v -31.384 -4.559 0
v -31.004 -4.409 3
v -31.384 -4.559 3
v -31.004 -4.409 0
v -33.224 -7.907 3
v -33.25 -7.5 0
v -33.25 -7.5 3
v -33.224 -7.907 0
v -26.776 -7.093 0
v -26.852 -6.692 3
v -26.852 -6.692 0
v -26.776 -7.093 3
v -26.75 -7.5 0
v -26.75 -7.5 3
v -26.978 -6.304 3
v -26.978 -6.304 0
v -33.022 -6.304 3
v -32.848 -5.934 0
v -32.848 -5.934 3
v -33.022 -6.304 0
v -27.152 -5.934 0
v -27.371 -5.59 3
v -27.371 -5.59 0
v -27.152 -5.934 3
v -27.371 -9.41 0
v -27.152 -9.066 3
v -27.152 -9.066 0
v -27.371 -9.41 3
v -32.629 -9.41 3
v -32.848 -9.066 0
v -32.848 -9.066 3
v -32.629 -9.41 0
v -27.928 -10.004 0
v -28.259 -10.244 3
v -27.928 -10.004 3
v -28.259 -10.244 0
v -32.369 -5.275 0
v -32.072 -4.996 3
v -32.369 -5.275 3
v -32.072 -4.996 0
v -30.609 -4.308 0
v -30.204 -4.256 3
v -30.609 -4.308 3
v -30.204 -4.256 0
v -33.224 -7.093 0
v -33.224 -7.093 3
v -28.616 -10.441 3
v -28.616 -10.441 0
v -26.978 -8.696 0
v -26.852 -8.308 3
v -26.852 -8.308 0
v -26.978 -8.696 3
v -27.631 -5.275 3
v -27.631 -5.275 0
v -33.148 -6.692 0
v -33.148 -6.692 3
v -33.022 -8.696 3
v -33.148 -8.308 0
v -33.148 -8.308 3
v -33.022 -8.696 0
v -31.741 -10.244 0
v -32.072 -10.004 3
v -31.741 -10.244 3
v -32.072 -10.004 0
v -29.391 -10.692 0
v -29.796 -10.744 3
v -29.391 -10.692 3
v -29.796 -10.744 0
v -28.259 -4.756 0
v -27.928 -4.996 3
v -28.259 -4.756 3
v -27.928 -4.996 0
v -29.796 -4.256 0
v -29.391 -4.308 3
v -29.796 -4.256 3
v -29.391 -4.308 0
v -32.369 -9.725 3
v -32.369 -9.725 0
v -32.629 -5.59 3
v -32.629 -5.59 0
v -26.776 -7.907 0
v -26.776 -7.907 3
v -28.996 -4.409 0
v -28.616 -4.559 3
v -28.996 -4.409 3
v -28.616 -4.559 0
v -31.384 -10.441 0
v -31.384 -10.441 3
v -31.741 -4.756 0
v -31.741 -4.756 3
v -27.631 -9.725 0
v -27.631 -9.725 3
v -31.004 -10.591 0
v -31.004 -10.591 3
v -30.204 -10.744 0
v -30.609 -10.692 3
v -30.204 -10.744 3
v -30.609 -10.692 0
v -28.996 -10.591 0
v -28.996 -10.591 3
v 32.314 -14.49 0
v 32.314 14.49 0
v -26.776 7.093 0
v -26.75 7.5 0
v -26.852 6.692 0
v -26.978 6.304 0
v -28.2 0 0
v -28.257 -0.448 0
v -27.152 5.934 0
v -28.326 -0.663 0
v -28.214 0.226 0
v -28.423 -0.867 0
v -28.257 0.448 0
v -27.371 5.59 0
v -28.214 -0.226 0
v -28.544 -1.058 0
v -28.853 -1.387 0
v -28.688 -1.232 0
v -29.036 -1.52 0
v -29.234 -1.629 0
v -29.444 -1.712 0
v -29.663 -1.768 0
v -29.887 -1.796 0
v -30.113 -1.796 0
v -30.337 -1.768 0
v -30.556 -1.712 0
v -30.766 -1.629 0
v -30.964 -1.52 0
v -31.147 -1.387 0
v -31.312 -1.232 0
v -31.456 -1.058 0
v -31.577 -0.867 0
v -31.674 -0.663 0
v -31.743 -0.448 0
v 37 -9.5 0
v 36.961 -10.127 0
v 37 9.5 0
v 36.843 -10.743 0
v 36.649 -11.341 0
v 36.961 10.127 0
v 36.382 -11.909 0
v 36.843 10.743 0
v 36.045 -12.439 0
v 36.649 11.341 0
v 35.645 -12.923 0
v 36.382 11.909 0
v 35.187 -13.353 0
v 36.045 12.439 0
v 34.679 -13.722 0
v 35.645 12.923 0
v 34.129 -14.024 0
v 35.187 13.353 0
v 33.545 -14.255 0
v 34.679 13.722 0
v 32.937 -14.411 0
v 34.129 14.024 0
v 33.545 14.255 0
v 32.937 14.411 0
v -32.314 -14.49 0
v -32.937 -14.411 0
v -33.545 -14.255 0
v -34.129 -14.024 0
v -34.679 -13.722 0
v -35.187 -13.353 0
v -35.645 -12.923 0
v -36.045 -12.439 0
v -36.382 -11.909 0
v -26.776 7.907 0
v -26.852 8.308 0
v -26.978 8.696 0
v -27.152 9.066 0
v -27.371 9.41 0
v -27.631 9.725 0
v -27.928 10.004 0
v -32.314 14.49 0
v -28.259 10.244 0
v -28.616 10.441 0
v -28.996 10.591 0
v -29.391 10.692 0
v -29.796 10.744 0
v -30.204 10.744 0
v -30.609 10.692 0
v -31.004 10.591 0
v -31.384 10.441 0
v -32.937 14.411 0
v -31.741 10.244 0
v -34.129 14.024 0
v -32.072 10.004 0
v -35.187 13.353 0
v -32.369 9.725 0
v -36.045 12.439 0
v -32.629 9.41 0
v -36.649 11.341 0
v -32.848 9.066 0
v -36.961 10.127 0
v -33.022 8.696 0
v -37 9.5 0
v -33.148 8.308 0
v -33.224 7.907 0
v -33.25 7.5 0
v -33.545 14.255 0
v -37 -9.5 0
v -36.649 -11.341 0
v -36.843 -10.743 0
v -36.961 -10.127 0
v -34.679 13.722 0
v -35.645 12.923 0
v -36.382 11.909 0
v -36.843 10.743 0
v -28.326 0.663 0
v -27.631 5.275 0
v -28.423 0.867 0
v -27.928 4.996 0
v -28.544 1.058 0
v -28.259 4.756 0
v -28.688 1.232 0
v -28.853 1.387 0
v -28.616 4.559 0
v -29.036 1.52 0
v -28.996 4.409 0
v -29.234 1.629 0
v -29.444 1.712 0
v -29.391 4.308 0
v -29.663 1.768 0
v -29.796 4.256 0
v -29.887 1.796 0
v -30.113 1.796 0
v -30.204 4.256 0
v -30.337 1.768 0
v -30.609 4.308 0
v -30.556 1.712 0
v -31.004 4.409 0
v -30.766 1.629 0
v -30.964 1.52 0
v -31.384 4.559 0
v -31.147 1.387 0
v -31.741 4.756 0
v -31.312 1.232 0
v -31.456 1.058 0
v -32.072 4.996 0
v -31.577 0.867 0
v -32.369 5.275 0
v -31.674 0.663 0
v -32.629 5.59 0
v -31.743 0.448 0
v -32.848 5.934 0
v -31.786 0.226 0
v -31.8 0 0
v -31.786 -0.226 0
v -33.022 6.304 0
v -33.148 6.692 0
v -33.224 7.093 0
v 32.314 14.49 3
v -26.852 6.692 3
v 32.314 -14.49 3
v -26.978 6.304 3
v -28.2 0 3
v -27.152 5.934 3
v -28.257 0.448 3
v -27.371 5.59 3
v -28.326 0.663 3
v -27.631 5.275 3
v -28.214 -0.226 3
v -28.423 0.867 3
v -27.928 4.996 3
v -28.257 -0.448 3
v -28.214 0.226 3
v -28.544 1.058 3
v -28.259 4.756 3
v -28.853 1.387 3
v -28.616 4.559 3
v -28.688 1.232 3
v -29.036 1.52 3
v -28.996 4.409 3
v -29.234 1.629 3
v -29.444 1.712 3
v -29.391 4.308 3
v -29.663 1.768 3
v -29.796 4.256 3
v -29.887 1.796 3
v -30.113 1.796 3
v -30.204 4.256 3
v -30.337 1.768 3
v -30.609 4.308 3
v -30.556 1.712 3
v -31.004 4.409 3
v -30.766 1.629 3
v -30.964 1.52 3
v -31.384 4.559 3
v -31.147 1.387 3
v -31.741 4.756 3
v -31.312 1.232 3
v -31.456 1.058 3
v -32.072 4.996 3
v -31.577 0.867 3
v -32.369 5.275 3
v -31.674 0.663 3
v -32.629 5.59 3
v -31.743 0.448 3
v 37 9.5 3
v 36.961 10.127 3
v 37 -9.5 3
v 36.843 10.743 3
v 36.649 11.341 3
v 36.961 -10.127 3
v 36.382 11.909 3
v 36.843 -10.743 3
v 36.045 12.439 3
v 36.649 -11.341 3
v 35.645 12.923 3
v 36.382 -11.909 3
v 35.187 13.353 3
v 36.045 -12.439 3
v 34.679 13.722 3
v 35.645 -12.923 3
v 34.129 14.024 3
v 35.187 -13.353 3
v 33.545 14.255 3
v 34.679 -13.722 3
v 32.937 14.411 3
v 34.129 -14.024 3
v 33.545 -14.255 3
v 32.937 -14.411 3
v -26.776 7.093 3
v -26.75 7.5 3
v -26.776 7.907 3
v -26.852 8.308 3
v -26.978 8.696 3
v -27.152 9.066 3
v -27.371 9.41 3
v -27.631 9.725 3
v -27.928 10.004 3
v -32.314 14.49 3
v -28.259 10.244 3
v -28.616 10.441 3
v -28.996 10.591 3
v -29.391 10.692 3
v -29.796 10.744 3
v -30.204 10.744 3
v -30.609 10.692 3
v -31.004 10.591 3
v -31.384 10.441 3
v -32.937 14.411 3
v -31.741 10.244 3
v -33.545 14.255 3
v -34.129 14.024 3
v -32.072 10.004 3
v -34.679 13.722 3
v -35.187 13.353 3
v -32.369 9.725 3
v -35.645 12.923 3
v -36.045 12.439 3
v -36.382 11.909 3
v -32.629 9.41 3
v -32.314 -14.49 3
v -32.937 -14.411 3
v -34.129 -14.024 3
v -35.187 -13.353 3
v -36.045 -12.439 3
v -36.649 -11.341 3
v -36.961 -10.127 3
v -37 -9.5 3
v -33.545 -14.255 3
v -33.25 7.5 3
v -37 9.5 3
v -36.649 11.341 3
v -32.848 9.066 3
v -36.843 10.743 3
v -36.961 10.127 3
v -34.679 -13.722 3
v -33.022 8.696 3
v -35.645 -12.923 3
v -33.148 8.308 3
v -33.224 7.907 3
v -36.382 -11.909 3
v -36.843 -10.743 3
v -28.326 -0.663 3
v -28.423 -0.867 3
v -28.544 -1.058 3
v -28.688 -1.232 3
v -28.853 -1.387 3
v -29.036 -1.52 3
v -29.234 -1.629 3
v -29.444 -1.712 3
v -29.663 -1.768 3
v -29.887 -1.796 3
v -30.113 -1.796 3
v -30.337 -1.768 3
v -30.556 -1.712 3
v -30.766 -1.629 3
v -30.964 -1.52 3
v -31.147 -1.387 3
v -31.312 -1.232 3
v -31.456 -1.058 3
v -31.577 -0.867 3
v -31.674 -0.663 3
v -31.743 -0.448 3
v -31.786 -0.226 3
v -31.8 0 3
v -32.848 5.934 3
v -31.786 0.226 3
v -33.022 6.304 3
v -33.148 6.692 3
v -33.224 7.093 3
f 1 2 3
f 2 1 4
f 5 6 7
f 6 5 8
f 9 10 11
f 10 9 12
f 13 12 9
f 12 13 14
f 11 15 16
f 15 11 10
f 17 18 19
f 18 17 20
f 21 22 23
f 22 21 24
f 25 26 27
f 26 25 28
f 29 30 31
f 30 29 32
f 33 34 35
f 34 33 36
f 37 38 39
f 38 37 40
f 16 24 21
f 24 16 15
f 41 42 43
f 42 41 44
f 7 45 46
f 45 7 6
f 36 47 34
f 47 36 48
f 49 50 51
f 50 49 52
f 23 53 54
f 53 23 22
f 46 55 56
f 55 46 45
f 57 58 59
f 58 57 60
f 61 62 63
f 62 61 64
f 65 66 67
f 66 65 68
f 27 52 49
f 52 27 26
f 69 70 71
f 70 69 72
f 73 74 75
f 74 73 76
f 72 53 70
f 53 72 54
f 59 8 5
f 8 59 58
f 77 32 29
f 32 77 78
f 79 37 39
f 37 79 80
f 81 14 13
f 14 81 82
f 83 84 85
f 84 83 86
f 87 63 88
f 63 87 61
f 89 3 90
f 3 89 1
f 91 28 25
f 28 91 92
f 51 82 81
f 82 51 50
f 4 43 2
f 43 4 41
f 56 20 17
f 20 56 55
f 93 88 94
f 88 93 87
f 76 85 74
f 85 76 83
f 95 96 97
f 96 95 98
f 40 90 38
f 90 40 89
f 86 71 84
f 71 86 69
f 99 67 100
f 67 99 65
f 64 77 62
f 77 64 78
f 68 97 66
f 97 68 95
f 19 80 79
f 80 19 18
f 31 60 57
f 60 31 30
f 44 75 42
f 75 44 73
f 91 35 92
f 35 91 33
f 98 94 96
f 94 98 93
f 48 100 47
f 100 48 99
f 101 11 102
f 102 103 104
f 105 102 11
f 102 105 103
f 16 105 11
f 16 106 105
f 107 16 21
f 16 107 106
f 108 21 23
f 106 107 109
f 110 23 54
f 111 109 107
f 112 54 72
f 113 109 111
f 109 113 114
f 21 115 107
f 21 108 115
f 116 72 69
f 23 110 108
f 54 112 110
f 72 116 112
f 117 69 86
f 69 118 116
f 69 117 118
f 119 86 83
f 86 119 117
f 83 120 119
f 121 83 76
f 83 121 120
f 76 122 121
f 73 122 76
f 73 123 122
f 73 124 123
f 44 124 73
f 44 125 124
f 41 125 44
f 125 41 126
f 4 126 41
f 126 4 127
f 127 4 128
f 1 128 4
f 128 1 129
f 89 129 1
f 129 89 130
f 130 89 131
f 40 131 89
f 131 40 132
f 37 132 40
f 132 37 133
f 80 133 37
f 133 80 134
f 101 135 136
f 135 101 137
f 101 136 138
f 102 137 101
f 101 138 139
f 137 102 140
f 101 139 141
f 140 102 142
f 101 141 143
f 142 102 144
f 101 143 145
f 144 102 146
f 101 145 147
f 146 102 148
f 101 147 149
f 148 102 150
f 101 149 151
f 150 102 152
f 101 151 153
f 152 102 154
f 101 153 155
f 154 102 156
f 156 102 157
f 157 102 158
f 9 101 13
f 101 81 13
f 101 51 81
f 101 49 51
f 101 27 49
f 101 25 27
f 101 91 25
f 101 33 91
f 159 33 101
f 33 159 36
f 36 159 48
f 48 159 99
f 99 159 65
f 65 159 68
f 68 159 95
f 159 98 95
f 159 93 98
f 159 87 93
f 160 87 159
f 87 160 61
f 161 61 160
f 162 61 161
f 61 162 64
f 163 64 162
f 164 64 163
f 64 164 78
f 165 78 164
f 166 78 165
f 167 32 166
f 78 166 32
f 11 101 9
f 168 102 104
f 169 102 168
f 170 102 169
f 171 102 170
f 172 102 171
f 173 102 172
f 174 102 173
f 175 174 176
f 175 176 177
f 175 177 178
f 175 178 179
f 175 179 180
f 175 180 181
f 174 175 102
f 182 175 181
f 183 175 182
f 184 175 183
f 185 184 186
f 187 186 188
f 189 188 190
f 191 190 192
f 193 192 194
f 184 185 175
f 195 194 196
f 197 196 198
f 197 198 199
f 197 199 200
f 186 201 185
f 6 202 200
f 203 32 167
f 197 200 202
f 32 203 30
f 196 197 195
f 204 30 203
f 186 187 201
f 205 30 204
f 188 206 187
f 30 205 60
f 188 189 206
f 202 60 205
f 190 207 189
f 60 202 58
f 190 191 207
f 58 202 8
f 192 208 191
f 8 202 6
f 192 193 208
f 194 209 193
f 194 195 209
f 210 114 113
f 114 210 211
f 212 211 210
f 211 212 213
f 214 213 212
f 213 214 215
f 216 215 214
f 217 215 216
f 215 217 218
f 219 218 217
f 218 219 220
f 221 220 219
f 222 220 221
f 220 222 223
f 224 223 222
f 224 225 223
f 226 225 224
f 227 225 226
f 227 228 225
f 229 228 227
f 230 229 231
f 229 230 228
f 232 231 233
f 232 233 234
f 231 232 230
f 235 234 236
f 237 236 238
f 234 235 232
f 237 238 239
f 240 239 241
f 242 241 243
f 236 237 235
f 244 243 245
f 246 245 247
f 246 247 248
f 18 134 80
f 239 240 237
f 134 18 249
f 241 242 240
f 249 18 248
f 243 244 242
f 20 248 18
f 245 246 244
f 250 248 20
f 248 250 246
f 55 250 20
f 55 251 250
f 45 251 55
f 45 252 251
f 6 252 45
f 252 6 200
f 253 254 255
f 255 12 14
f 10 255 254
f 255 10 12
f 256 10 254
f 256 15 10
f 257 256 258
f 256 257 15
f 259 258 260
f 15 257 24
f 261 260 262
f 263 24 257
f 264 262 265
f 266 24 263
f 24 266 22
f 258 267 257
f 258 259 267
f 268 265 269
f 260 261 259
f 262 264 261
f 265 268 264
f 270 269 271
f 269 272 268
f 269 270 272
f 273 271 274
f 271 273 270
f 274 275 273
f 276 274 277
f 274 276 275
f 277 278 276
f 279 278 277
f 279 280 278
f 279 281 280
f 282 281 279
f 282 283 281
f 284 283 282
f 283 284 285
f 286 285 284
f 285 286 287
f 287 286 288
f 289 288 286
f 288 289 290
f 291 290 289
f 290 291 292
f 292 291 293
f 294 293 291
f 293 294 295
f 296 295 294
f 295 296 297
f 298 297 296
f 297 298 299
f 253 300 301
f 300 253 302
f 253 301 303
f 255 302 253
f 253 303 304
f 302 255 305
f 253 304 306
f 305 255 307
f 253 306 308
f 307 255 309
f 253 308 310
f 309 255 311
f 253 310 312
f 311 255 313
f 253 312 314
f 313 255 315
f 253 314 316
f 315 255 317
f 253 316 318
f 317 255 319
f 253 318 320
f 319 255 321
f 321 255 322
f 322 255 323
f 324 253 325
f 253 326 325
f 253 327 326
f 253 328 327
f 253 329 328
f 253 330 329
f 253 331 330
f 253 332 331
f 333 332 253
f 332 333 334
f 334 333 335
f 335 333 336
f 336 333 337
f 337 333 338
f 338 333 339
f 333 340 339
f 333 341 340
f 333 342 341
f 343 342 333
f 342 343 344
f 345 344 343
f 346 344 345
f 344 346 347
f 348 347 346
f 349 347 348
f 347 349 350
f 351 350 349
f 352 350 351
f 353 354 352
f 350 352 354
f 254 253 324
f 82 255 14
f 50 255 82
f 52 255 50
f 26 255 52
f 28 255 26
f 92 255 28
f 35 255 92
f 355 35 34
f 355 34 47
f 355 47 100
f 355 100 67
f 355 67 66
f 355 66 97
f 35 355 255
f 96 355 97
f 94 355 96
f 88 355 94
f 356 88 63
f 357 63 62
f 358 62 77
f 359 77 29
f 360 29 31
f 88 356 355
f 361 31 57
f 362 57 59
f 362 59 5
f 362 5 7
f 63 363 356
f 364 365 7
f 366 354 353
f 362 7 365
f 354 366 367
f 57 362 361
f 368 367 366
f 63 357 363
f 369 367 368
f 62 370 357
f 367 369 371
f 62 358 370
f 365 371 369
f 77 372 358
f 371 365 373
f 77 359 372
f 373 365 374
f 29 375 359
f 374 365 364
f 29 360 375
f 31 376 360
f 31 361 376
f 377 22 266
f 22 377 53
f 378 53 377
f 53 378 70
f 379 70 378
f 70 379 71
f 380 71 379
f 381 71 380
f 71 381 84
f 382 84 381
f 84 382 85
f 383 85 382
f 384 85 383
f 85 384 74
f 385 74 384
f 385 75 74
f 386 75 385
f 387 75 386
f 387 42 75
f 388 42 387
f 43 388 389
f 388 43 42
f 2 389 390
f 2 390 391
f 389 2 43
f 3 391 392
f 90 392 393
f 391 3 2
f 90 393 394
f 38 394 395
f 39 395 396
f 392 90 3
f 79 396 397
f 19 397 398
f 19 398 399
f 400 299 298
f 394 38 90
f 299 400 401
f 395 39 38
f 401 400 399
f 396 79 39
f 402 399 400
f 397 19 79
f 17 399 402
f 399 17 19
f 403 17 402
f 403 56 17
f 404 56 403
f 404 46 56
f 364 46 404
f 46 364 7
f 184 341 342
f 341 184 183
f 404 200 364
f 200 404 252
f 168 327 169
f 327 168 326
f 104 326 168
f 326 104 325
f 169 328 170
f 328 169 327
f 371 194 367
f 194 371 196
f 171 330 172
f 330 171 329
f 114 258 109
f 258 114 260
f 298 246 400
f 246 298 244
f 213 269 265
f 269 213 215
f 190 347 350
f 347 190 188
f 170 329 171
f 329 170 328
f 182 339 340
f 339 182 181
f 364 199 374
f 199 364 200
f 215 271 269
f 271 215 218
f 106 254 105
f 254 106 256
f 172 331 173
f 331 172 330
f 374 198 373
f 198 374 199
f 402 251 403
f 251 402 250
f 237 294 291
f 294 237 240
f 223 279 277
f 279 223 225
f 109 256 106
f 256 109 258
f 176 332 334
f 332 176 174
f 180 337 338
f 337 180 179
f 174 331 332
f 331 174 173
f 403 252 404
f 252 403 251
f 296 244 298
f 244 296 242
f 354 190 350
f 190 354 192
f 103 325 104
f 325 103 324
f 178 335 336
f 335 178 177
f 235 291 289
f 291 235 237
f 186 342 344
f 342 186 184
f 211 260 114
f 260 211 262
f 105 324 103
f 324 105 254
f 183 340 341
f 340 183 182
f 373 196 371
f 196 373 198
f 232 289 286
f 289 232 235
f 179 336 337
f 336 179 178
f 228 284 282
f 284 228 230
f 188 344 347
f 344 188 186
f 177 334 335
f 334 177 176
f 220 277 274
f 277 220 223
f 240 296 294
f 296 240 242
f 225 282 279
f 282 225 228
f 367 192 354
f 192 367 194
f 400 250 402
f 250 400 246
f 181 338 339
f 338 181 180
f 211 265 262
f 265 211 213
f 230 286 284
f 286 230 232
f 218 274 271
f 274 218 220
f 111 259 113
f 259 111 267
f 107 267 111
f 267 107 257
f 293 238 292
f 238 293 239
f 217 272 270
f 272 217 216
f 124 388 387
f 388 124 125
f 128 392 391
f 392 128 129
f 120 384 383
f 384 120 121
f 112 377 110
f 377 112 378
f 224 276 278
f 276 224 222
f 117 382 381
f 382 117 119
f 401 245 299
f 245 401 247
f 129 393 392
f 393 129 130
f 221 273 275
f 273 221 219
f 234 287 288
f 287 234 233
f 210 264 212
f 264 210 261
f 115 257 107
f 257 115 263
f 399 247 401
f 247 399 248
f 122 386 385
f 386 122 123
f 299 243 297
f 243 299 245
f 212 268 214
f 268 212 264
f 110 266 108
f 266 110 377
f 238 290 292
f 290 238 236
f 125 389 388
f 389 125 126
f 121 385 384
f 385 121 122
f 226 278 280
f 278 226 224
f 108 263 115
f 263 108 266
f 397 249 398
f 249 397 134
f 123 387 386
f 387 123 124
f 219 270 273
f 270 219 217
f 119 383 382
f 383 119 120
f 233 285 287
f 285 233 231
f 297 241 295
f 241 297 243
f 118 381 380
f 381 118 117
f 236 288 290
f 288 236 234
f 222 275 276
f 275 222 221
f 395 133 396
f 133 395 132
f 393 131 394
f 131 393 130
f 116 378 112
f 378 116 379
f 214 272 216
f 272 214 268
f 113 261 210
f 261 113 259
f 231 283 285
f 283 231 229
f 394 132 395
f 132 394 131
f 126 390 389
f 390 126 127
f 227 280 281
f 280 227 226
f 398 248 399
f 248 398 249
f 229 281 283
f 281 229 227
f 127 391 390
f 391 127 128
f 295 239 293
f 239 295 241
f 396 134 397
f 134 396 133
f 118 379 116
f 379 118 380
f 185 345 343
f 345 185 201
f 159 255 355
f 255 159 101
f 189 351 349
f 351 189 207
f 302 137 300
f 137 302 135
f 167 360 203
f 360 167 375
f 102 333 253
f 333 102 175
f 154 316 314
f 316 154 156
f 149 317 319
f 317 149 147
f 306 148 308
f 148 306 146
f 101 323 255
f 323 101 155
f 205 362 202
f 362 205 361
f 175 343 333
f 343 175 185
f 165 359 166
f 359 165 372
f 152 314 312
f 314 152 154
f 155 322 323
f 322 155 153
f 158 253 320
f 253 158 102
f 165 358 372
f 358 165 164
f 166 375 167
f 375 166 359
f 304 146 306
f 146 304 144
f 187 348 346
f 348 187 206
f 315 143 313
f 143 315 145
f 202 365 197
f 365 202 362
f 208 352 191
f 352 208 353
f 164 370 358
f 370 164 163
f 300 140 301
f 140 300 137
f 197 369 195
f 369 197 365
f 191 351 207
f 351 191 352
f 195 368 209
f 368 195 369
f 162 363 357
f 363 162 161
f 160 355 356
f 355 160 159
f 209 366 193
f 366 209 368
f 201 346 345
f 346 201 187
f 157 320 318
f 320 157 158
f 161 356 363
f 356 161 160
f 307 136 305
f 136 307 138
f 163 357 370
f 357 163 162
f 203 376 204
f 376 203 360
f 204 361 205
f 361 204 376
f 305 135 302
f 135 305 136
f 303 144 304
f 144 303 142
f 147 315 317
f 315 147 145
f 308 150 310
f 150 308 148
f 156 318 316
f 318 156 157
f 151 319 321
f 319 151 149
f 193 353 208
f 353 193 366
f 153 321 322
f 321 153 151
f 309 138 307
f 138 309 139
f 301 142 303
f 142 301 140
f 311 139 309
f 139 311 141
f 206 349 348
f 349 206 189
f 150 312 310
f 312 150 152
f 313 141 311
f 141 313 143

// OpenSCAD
$fn = 50;


difference() {
	union() {
		hull() {
			translate(v = [-32.0000000000, 9.5000000000, 0]) {
				cylinder(h = 3, r = 5);
			}
			translate(v = [32.0000000000, 9.5000000000, 0]) {
				cylinder(h = 3, r = 5);
			}
			translate(v = [-32.0000000000, -9.5000000000, 0]) {
				cylinder(h = 3, r = 5);
			}
			translate(v = [32.0000000000, -9.5000000000, 0]) {
				cylinder(h = 3, r = 5);
			}
		}
	}
	union() {
		translate(v = [-30.0000000000, -7.5000000000, 0]) {
			cylinder(h = 3, r = 3.2500000000);
		}
		translate(v = [-30.0000000000, 7.5000000000, 0]) {
			cylinder(h = 3, r = 3.2500000000);
		}
		translate(v = [-30.0000000000, -7.5000000000, 0]) {
			cylinder(h = 3, r = 1.8000000000);
		}
		translate(v = [-30.0000000000, 0.0000000000, 0]) {
			cylinder(h = 3, r = 1.8000000000);
		}
		translate(v = [-30.0000000000, 7.5000000000, 0]) {
			cylinder(h = 3, r = 1.8000000000);
		}
		translate(v = [-30.0000000000, -7.5000000000, 0]) {
			cylinder(h = 3, r = 1.8000000000);
		}
		translate(v = [-30.0000000000, 0.0000000000, 0]) {
			cylinder(h = 3, r = 1.8000000000);
		}
		translate(v = [-30.0000000000, 7.5000000000, 0]) {
			cylinder(h = 3, r = 1.8000000000);
		}
		translate(v = [-30.0000000000, -7.5000000000, 0]) {
			cylinder(h = 3, r = 1.8000000000);
		}
		translate(v = [-30.0000000000, 0.0000000000, 0]) {
			cylinder(h = 3, r = 1.8000000000);
		}
		translate(v = [-30.0000000000, 7.5000000000, 0]) {
			cylinder(h = 3, r = 1.8000000000);
		}
	}
}
